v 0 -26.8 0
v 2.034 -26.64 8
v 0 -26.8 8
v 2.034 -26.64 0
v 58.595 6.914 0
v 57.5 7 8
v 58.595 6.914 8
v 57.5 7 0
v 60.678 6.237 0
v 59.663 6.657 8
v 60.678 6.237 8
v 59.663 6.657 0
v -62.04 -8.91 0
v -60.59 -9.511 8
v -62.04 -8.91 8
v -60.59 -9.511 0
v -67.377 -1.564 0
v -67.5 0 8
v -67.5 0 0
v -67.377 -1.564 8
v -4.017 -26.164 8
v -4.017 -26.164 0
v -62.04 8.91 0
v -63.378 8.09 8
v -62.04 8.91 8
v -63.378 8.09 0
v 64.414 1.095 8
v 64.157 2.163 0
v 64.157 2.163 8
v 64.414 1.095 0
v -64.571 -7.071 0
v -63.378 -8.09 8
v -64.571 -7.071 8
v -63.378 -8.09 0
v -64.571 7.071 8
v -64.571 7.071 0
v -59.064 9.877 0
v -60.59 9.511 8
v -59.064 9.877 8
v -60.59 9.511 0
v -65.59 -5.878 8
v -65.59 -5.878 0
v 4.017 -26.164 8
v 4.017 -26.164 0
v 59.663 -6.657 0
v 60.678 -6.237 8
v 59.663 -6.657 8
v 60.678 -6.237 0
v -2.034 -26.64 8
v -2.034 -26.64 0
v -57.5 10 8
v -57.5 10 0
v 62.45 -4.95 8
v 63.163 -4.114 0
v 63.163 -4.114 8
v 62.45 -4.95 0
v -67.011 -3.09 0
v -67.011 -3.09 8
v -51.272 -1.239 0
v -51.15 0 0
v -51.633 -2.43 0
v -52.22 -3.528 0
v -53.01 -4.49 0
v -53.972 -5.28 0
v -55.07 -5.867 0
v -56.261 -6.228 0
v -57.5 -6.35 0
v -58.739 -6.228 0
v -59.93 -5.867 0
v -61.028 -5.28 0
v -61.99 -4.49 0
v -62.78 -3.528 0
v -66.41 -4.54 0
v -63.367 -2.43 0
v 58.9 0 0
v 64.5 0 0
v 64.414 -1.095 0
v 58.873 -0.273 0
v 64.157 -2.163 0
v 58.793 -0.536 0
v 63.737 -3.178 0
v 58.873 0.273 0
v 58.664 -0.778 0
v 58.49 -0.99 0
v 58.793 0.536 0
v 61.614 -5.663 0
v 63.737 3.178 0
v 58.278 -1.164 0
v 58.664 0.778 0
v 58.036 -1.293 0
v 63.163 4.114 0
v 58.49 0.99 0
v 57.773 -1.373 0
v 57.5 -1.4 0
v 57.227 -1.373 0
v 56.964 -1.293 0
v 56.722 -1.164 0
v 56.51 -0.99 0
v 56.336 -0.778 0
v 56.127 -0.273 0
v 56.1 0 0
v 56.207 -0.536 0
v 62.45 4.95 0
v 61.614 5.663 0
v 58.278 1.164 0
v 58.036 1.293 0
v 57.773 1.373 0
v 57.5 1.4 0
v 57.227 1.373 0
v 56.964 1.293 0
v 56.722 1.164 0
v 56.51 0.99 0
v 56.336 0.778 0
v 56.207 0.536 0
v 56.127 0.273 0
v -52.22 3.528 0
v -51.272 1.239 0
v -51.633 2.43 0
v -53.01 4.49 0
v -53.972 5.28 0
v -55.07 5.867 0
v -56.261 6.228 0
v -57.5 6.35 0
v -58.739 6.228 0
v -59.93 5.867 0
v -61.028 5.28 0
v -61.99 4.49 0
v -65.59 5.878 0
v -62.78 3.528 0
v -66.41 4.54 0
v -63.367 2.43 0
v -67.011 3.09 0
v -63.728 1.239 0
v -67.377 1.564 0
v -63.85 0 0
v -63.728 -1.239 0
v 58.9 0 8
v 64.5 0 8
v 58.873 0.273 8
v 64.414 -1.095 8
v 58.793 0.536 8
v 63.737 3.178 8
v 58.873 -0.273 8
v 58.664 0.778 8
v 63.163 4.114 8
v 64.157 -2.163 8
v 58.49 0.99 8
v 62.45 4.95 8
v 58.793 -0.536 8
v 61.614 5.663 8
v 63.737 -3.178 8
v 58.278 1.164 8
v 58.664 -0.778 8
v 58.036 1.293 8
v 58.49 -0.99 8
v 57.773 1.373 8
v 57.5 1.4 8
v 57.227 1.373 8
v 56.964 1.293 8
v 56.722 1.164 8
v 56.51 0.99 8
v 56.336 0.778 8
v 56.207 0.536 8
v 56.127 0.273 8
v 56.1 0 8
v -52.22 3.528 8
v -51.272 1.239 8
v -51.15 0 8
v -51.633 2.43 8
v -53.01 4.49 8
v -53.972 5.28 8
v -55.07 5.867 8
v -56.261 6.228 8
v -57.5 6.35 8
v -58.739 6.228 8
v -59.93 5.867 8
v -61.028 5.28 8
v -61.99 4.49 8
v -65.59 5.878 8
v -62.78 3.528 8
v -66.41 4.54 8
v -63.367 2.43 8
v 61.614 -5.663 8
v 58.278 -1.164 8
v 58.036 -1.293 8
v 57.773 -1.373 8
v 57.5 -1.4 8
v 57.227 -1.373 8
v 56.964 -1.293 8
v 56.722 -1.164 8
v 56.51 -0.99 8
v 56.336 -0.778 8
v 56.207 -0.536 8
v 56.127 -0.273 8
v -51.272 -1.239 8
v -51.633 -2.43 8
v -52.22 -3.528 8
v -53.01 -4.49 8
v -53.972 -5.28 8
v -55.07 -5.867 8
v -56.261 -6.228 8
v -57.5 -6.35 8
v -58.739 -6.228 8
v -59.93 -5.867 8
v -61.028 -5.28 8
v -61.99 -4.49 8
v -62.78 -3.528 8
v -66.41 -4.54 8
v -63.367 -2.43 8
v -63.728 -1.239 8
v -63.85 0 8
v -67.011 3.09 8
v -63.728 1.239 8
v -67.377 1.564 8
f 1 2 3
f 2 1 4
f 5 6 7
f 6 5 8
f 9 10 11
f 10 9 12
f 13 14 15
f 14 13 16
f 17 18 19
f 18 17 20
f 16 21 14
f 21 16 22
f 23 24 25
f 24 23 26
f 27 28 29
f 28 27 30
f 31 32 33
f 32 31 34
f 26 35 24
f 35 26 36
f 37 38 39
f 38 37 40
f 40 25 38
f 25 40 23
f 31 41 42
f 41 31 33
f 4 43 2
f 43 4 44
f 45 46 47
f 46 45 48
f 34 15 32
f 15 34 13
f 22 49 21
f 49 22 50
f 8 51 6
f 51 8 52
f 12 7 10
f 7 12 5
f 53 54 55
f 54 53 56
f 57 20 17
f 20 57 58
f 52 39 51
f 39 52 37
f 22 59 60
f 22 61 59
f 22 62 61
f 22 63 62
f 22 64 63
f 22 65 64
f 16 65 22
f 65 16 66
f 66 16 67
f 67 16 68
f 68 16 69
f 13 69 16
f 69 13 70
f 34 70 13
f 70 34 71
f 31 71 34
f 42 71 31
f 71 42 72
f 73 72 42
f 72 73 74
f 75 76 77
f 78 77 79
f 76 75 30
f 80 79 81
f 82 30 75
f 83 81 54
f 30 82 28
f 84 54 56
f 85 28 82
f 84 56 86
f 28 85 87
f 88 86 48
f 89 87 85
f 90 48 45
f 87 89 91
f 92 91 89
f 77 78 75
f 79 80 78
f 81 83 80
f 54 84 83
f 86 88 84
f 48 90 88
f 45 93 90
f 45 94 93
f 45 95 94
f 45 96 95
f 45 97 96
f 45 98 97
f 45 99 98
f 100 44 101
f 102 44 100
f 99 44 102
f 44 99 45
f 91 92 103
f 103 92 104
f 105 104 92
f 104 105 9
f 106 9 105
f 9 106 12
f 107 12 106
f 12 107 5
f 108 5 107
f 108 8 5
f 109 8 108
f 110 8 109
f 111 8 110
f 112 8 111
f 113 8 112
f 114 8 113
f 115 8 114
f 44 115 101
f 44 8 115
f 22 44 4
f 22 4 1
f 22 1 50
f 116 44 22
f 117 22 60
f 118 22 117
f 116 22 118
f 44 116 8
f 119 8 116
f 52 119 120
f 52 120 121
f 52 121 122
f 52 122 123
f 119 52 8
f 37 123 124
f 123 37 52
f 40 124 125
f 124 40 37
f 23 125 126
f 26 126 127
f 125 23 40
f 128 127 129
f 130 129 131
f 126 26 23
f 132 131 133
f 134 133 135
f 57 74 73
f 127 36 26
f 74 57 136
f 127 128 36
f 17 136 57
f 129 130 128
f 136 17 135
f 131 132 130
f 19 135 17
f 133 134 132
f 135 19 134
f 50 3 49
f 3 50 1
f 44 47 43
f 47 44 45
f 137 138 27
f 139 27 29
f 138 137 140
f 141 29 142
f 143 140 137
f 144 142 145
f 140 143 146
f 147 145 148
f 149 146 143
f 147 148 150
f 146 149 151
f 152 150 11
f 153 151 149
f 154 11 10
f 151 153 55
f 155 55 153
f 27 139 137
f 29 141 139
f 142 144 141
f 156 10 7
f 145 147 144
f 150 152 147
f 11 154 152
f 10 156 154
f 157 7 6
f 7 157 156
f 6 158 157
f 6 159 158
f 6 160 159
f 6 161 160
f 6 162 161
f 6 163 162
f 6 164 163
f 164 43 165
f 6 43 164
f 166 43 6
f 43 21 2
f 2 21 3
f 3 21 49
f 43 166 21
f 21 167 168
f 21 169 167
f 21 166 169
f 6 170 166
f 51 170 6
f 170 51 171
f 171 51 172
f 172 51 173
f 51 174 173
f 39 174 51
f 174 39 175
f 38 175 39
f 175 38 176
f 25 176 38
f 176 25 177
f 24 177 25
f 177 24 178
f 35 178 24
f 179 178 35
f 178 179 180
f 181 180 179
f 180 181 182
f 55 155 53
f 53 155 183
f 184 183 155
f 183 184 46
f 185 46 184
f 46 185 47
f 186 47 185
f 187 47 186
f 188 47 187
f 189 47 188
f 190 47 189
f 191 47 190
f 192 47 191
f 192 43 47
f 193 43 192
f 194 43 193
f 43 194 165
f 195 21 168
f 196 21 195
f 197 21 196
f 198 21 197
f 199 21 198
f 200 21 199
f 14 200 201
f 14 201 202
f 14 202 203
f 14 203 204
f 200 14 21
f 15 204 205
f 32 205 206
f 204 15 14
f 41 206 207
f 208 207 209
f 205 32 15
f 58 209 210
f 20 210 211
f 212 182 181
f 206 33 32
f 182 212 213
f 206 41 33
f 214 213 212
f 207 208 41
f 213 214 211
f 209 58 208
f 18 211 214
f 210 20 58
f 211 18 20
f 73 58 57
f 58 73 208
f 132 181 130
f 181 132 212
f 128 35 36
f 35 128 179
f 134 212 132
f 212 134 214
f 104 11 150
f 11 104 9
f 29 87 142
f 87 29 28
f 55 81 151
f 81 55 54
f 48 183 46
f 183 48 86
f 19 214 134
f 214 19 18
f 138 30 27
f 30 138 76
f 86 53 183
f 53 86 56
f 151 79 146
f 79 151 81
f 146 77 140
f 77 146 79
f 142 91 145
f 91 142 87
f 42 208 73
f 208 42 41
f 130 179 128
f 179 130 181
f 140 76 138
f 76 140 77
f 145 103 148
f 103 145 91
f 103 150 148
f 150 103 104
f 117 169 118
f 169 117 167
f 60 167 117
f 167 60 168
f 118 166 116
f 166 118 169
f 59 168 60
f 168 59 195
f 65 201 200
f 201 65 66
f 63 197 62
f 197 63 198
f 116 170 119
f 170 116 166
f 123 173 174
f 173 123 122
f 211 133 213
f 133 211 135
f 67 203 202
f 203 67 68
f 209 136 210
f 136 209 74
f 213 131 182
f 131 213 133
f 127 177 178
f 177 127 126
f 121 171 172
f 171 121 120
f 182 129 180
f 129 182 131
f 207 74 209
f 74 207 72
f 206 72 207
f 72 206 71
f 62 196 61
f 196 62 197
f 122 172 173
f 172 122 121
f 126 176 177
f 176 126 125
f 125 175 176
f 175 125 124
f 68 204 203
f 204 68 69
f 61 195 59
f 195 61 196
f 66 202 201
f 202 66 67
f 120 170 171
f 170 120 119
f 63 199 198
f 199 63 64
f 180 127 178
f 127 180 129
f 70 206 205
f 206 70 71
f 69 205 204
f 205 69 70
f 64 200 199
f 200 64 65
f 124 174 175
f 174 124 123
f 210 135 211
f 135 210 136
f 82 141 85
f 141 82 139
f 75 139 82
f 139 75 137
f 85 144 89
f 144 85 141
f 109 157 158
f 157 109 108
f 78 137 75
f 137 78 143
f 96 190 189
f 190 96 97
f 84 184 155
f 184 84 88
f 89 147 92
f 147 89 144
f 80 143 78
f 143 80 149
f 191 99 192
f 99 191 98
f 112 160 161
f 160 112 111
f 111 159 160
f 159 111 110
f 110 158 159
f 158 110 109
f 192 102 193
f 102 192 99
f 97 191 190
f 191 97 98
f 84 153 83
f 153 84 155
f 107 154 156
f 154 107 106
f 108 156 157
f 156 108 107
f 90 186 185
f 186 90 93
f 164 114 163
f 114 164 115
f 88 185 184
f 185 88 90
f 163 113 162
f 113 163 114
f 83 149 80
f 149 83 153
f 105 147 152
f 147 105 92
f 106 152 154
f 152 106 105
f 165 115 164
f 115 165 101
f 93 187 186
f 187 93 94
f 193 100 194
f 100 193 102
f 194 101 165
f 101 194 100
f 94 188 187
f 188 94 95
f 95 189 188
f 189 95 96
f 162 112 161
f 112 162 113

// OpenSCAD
$fn = 32;

// ----------------------------------------------------------------------
// Lever: 115 mm between the bosses, 8 mm thick, smooth outline
// ----------------------------------------------------------------------

// --- parameters (mm) ---
lever_l = 115;            // distance between the boss centres
boss_a = 20;              // first boss diameter
boss_b = 14;              // second boss diameter
bore_a = 12.7;            // first bore
bore_b = 2.8;             // second bore
lever_t = 8;              // lever thickness
boss_c = 26;              // middle boss diameter
bend = 13.8;              // how far the middle boss drops

lever_profile = [[-67.5, 0], [-67.377, -1.564], [-67.011, -3.09], [-66.41, -4.54], [-65.59, -5.878], [-64.571, -7.071], [-63.378, -8.09], [-62.04, -8.91], [-60.59, -9.511], [-4.017, -26.164], [-2.034, -26.64], [0, -26.8], [2.034, -26.64], [4.017, -26.164], [59.663, -6.657], [60.678, -6.237], [61.614, -5.663], [62.45, -4.95], [63.163, -4.114], [63.737, -3.178], [64.157, -2.163], [64.414, -1.095], [64.5, 0], [64.414, 1.095], [64.157, 2.163], [63.737, 3.178], [63.163, 4.114], [62.45, 4.95], [61.614, 5.663], [60.678, 6.237], [59.663, 6.657], [58.595, 6.914], [57.5, 7], [-57.5, 10], [-59.064, 9.877], [-60.59, 9.511], [-62.04, 8.91], [-63.378, 8.09], [-64.571, 7.071], [-65.59, 5.878], [-66.41, 4.54], [-67.011, 3.09], [-67.377, 1.564]];

difference() {
  linear_extrude(height = lever_t) polygon(lever_profile);
  translate([-57.5, 0, -2.5]) cylinder(h = lever_t + 5, d = bore_a);
  translate([57.5, 0, -2.5]) cylinder(h = lever_t + 5, d = bore_b);
}
